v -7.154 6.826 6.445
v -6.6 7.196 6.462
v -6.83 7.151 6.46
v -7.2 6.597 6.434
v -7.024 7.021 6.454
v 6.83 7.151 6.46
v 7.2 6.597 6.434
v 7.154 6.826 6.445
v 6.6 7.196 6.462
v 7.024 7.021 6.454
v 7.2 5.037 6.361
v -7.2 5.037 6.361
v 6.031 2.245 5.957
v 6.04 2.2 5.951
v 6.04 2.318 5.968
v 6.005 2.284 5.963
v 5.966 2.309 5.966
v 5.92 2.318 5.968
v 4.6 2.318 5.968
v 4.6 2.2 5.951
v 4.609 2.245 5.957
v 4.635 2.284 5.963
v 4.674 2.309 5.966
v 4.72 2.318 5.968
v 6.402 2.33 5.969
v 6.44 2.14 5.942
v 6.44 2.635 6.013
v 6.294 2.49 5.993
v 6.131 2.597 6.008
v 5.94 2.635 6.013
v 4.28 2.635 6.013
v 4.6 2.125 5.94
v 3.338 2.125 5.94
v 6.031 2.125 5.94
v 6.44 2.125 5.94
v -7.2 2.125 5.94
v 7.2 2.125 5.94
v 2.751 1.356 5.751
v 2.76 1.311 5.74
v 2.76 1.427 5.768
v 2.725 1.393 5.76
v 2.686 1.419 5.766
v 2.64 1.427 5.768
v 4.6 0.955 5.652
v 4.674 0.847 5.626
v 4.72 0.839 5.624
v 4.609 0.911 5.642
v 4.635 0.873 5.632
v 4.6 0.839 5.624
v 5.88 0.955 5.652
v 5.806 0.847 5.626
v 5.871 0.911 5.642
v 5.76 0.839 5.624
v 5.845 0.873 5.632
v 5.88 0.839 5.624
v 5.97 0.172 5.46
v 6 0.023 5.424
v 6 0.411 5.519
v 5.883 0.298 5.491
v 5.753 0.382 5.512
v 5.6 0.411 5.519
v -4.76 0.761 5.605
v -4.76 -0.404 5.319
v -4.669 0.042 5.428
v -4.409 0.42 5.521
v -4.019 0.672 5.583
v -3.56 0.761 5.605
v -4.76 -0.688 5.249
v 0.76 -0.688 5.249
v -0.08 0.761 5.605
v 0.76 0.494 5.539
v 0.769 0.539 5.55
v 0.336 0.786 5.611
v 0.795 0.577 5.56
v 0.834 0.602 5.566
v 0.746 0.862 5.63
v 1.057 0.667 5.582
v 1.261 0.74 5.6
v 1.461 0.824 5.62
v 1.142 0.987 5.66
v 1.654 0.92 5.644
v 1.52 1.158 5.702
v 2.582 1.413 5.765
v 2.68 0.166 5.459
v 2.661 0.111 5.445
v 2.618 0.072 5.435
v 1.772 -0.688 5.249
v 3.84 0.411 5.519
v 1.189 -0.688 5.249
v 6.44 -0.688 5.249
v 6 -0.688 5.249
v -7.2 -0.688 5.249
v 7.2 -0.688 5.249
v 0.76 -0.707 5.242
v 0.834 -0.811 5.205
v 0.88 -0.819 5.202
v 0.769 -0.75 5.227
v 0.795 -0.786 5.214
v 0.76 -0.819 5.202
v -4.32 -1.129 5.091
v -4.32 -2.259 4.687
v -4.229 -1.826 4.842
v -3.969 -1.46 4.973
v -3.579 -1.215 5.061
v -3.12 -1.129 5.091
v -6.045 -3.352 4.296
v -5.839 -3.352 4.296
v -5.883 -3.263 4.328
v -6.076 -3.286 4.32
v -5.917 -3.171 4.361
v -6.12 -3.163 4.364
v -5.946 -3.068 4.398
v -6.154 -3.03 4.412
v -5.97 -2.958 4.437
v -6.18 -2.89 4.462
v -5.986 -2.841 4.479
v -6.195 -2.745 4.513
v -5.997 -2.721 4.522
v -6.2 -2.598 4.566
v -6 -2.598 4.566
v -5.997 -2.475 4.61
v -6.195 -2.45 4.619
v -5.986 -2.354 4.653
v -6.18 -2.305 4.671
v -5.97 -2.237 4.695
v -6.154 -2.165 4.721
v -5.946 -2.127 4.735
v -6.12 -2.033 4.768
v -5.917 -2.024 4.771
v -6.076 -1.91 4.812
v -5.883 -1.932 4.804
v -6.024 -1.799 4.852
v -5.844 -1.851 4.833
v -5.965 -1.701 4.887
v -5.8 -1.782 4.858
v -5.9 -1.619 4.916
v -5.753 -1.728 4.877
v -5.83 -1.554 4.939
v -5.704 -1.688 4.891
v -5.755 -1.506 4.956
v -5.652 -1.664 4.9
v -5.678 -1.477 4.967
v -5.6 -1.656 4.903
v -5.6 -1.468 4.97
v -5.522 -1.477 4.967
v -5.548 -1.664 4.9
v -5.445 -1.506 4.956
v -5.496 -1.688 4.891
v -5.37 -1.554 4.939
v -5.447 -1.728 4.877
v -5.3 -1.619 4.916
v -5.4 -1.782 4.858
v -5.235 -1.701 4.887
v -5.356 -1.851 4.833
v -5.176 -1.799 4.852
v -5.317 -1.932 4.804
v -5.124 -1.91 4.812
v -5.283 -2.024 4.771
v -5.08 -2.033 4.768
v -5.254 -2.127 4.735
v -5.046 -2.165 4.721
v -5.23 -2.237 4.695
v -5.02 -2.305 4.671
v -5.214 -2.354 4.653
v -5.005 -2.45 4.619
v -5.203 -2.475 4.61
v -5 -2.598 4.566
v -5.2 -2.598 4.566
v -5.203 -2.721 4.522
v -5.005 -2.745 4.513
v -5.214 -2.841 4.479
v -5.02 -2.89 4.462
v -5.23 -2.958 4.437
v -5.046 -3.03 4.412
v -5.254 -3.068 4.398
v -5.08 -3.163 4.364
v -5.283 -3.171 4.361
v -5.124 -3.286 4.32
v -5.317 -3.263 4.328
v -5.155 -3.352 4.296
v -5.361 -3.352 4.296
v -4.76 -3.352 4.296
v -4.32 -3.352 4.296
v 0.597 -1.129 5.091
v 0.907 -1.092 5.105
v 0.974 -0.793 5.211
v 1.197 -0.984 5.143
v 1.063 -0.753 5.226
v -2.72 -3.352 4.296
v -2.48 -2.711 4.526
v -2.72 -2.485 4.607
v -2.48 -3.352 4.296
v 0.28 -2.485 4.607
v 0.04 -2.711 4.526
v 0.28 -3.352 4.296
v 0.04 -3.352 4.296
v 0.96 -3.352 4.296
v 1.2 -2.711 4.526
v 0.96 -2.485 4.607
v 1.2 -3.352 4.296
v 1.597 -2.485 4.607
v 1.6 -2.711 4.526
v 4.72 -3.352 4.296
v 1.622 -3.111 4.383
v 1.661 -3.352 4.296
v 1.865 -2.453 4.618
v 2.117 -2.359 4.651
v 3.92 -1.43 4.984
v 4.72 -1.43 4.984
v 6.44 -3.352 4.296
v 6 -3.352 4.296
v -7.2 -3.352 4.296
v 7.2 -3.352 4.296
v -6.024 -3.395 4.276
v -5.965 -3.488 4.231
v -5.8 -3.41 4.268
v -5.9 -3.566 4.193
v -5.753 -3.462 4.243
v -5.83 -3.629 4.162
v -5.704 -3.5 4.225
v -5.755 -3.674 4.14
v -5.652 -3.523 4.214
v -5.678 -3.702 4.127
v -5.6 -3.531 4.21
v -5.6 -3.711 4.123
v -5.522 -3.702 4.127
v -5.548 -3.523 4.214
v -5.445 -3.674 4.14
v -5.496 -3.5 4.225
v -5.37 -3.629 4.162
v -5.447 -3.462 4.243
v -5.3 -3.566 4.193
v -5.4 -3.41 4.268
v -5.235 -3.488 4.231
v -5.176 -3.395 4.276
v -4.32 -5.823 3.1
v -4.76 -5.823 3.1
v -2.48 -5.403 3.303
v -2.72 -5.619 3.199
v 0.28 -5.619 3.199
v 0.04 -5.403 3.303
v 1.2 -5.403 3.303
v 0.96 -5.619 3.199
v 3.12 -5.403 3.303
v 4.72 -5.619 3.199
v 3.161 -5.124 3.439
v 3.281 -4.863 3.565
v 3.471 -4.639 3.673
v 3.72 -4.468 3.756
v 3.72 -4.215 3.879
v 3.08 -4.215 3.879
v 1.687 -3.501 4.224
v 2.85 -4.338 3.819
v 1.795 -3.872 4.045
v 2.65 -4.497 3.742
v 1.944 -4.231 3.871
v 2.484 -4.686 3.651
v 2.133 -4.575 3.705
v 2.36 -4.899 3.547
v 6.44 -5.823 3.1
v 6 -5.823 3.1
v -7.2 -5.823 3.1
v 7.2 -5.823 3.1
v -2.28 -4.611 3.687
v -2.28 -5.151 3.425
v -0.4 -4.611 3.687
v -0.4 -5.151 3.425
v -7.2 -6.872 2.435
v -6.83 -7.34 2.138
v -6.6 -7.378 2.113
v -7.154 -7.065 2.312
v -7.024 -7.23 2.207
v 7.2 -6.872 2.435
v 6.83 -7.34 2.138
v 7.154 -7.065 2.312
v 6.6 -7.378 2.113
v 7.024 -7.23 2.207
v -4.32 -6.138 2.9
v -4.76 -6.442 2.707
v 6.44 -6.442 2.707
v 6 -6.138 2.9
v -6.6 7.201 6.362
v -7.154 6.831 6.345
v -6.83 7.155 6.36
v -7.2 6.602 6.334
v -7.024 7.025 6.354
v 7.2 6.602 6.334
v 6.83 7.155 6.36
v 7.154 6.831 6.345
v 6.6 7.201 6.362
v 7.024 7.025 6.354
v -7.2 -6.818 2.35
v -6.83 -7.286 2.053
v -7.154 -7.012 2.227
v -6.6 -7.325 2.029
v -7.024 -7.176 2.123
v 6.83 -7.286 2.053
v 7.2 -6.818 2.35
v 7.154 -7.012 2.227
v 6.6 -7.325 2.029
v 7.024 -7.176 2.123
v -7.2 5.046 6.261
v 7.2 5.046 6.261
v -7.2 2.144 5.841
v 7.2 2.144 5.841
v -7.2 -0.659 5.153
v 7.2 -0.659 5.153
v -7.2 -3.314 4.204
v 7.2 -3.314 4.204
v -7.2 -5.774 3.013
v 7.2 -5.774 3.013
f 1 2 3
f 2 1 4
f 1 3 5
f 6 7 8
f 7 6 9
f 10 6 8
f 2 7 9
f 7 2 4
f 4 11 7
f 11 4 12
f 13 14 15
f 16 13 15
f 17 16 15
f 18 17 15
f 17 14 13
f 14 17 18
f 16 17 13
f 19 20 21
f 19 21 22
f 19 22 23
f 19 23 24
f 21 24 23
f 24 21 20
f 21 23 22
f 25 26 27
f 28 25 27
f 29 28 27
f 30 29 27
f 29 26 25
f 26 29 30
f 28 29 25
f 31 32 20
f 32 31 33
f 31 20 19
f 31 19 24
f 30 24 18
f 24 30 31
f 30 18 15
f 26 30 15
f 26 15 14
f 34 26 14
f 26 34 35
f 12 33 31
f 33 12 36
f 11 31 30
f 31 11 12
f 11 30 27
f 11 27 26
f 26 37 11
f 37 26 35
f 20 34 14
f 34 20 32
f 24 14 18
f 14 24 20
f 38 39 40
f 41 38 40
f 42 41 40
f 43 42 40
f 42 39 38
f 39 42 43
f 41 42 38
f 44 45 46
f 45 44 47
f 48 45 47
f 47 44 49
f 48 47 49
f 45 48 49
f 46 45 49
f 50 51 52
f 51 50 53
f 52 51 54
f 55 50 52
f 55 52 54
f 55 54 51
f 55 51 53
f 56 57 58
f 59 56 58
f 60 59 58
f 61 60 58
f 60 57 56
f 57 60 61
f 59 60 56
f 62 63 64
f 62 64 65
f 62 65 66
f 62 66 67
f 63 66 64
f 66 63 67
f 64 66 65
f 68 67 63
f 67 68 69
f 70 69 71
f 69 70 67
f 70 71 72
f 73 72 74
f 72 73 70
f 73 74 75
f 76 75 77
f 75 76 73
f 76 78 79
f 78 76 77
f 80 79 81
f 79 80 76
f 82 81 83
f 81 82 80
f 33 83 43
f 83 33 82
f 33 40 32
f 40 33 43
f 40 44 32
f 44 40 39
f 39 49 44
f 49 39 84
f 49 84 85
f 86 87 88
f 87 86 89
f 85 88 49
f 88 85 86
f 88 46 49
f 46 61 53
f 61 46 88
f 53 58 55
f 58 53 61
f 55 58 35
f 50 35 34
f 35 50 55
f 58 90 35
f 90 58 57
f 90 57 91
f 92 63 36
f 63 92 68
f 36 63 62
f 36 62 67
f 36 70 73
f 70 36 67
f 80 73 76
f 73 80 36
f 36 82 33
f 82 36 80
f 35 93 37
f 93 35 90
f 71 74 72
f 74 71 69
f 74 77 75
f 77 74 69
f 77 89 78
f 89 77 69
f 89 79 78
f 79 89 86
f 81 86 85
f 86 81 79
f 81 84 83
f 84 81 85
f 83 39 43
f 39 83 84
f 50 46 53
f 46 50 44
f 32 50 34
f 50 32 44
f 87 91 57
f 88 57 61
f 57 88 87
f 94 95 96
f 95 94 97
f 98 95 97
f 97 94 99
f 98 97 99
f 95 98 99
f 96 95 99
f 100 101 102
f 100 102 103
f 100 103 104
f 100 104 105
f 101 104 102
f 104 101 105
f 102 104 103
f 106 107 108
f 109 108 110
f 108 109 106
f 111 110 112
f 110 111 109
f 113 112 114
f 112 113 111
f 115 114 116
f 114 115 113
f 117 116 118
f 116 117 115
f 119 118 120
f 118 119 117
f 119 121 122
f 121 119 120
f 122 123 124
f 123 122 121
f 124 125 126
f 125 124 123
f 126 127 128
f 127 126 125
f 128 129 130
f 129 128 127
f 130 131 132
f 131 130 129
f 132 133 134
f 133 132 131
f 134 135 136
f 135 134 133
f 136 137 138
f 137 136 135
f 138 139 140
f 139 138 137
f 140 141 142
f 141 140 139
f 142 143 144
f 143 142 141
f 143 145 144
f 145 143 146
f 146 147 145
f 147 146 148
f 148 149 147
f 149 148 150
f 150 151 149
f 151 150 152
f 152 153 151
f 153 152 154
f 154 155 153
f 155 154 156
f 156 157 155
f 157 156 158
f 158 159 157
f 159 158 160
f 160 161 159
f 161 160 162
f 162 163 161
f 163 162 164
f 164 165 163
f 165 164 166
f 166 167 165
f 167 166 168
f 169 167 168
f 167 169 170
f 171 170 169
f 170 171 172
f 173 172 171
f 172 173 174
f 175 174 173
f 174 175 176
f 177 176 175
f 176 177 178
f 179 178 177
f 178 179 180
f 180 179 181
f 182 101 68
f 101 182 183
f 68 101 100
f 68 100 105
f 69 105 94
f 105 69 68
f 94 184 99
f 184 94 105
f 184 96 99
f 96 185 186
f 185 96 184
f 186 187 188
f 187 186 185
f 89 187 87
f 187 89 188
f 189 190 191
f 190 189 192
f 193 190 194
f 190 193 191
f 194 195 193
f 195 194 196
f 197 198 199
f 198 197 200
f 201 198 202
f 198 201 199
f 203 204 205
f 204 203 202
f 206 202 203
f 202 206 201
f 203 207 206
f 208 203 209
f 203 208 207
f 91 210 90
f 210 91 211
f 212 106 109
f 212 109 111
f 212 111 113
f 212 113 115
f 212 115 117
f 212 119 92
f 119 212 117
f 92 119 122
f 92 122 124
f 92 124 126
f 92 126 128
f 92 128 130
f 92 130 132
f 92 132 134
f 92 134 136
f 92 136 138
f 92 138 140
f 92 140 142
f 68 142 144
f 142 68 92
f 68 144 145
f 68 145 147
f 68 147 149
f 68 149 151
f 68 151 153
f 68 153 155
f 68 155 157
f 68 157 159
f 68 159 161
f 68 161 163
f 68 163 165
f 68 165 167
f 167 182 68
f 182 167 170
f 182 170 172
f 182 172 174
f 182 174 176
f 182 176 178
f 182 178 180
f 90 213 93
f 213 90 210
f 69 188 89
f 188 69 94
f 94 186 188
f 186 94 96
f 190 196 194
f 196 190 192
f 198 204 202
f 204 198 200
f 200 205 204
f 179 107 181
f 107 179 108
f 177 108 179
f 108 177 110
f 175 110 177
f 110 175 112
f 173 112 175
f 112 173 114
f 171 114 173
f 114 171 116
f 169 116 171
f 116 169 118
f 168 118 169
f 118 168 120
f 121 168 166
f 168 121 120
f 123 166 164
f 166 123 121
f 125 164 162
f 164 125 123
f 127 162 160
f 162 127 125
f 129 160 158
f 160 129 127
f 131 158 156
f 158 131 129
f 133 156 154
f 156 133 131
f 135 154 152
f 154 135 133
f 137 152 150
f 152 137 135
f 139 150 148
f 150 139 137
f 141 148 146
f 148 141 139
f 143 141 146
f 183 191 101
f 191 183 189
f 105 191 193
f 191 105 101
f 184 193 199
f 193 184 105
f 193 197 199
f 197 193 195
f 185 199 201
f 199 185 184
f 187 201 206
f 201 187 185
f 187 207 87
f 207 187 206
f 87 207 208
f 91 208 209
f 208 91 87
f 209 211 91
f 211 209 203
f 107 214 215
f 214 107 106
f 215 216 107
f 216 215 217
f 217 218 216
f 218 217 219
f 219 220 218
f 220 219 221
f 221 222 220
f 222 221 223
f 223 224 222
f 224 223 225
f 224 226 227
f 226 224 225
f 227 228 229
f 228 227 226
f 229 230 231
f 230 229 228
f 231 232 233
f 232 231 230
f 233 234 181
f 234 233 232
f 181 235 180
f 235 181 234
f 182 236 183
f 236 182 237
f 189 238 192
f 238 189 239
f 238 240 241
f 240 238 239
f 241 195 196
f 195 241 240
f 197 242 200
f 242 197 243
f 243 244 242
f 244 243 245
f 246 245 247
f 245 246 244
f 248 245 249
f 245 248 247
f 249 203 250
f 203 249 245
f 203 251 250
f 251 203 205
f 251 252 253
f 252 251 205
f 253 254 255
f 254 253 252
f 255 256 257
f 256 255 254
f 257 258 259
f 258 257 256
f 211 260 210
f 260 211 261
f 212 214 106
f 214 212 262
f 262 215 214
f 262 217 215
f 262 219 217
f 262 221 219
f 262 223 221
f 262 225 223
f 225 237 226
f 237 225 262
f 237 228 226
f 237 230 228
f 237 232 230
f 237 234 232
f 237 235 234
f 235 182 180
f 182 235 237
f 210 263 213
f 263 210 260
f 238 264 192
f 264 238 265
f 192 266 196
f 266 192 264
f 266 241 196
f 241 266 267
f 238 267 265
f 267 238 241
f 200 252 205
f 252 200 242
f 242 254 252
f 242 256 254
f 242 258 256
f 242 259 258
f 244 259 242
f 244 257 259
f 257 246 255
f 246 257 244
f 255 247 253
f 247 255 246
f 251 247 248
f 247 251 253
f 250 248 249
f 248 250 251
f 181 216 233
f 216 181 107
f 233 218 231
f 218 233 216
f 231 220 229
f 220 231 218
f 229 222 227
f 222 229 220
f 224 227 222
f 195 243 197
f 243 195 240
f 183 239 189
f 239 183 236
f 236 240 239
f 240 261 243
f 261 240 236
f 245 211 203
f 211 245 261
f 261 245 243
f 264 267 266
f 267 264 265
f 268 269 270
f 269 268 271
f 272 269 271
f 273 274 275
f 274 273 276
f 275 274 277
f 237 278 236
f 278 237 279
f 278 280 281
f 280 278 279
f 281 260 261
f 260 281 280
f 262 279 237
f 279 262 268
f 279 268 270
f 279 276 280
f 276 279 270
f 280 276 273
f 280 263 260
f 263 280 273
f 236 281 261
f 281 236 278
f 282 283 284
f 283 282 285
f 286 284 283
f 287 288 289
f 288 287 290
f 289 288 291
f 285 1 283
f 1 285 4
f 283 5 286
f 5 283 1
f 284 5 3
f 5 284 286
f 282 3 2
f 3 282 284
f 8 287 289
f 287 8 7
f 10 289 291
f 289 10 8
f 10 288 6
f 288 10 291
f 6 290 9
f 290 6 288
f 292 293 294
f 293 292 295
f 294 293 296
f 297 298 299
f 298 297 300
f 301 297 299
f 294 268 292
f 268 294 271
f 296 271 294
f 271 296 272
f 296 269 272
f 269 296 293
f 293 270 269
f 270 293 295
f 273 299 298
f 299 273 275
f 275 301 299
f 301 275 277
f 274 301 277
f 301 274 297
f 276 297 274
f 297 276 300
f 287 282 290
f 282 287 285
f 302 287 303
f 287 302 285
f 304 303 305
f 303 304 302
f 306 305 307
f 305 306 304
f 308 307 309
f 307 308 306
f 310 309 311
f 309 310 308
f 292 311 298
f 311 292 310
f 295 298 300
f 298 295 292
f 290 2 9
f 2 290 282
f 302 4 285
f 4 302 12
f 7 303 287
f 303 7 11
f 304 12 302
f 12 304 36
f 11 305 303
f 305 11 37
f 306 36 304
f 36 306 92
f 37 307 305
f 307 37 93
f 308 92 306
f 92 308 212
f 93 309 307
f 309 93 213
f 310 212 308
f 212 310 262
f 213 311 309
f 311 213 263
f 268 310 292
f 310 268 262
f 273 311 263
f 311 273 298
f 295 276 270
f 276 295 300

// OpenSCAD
use <../lib.scad>
use <s/6141875rs01.scad>
use <s/6141875rs02.scad>
use <s/6141875rs03.scad>
use <s/6141875rs04.scad>
use <s/6141875rs05.scad>
use <s/6141875rs06.scad>
use <s/6141875rs08.scad>
function ldraw_lib__6141875rc01() = [
// 0 Sticker  1.9 x  1.8 with Taillamp on Blue Background Left (Formed)
// 0 Name: 6141875rc01.dat
// 0 Author: Massimo Maso [Sirio]
// 0 !LDRAW_ORG Part UPDATE 2023-04
// 0 !LICENSE Licensed under CC BY 4.0 : see CAreadme.txt
// 
// 0 BFC CERTIFY CCW
  [0,"BFC","CERTIFY"],
  [0,"BFC","CCW"],
// 
// 0 !KEYWORDS Bricklink 75875stk01, Brickowl 53567, F-150, Ford, Raptor
// 0 !KEYWORDS Rebrickable 24760, Set 75875, Speed Champions
// 
// 0 !HISTORY 2023-08-25 [OrionP] Official Update 2023-04
// 
// 
// 1 16 0 -15.6524 12.616 1 0 0 0 .998894 -.047023 0 .047023 .998894 s\6141875rs01.dat
  [1,16,0,-15.6524,12.616,1,0,0,0,.998894,-.047023,0,.047023,.998894, ldraw_lib__s__6141875rs01()],
// 1 16 0 -15.6524 12.616 1 0 0 0 .989715 -.143056 0 .143056 .989715 s\6141875rs02.dat
  [1,16,0,-15.6524,12.616,1,0,0,0,.989715,-.143056,0,.143056,.989715, ldraw_lib__s__6141875rs02()],
// 1 16 0 -12.8827 -1.648 1 0 0 0 .971148 -.238478 0 .238478 .971148 s\6141875rs03.dat
  [1,16,0,-12.8827,-1.648,1,0,0,0,.971148,-.238478,0,.238478,.971148, ldraw_lib__s__6141875rs03()],
// 1 16 0 -12.8827 -1.648 1 0 0 0 .941616 -.336689 0 .336689 .941616 s\6141875rs04.dat
  [1,16,0,-12.8827,-1.648,1,0,0,0,.941616,-.336689,0,.336689,.941616, ldraw_lib__s__6141875rs04()],
// 1 16 0 -7.5316 -14.436 1 0 0 0 .900072 -.435742 0 .435742 .900072 s\6141875rs05.dat
  [1,16,0,-7.5316,-14.436,1,0,0,0,.900072,-.435742,0,.435742,.900072, ldraw_lib__s__6141875rs05()],
// 1 16 0 -7.5316 -14.436 1 0 0 0 .844289 -.535889 0 .535889 .844289 s\6141875rs06.dat
  [1,16,0,-7.5316,-14.436,1,0,0,0,.844289,-.535889,0,.535889,.844289, ldraw_lib__s__6141875rs06()],
// 1 16 0 0 0 1 0 0 0 1 0 0 0 1 s\6141875rs08.dat
  [1,16,0,0,0,1,0,0,0,1,0,0,0,1, ldraw_lib__s__6141875rs08()],
];
module ldraw_lib__6141875rc01(step=0, col=false, unit=2/5, alt=false, line=0.2, solid=!$preview)
    makepoly(ldraw_lib__6141875rc01(), step=step, col=col, unit=unit, alt=alt, line=line, solid=solid);
ldraw_lib__6141875rc01(line=0.2);
